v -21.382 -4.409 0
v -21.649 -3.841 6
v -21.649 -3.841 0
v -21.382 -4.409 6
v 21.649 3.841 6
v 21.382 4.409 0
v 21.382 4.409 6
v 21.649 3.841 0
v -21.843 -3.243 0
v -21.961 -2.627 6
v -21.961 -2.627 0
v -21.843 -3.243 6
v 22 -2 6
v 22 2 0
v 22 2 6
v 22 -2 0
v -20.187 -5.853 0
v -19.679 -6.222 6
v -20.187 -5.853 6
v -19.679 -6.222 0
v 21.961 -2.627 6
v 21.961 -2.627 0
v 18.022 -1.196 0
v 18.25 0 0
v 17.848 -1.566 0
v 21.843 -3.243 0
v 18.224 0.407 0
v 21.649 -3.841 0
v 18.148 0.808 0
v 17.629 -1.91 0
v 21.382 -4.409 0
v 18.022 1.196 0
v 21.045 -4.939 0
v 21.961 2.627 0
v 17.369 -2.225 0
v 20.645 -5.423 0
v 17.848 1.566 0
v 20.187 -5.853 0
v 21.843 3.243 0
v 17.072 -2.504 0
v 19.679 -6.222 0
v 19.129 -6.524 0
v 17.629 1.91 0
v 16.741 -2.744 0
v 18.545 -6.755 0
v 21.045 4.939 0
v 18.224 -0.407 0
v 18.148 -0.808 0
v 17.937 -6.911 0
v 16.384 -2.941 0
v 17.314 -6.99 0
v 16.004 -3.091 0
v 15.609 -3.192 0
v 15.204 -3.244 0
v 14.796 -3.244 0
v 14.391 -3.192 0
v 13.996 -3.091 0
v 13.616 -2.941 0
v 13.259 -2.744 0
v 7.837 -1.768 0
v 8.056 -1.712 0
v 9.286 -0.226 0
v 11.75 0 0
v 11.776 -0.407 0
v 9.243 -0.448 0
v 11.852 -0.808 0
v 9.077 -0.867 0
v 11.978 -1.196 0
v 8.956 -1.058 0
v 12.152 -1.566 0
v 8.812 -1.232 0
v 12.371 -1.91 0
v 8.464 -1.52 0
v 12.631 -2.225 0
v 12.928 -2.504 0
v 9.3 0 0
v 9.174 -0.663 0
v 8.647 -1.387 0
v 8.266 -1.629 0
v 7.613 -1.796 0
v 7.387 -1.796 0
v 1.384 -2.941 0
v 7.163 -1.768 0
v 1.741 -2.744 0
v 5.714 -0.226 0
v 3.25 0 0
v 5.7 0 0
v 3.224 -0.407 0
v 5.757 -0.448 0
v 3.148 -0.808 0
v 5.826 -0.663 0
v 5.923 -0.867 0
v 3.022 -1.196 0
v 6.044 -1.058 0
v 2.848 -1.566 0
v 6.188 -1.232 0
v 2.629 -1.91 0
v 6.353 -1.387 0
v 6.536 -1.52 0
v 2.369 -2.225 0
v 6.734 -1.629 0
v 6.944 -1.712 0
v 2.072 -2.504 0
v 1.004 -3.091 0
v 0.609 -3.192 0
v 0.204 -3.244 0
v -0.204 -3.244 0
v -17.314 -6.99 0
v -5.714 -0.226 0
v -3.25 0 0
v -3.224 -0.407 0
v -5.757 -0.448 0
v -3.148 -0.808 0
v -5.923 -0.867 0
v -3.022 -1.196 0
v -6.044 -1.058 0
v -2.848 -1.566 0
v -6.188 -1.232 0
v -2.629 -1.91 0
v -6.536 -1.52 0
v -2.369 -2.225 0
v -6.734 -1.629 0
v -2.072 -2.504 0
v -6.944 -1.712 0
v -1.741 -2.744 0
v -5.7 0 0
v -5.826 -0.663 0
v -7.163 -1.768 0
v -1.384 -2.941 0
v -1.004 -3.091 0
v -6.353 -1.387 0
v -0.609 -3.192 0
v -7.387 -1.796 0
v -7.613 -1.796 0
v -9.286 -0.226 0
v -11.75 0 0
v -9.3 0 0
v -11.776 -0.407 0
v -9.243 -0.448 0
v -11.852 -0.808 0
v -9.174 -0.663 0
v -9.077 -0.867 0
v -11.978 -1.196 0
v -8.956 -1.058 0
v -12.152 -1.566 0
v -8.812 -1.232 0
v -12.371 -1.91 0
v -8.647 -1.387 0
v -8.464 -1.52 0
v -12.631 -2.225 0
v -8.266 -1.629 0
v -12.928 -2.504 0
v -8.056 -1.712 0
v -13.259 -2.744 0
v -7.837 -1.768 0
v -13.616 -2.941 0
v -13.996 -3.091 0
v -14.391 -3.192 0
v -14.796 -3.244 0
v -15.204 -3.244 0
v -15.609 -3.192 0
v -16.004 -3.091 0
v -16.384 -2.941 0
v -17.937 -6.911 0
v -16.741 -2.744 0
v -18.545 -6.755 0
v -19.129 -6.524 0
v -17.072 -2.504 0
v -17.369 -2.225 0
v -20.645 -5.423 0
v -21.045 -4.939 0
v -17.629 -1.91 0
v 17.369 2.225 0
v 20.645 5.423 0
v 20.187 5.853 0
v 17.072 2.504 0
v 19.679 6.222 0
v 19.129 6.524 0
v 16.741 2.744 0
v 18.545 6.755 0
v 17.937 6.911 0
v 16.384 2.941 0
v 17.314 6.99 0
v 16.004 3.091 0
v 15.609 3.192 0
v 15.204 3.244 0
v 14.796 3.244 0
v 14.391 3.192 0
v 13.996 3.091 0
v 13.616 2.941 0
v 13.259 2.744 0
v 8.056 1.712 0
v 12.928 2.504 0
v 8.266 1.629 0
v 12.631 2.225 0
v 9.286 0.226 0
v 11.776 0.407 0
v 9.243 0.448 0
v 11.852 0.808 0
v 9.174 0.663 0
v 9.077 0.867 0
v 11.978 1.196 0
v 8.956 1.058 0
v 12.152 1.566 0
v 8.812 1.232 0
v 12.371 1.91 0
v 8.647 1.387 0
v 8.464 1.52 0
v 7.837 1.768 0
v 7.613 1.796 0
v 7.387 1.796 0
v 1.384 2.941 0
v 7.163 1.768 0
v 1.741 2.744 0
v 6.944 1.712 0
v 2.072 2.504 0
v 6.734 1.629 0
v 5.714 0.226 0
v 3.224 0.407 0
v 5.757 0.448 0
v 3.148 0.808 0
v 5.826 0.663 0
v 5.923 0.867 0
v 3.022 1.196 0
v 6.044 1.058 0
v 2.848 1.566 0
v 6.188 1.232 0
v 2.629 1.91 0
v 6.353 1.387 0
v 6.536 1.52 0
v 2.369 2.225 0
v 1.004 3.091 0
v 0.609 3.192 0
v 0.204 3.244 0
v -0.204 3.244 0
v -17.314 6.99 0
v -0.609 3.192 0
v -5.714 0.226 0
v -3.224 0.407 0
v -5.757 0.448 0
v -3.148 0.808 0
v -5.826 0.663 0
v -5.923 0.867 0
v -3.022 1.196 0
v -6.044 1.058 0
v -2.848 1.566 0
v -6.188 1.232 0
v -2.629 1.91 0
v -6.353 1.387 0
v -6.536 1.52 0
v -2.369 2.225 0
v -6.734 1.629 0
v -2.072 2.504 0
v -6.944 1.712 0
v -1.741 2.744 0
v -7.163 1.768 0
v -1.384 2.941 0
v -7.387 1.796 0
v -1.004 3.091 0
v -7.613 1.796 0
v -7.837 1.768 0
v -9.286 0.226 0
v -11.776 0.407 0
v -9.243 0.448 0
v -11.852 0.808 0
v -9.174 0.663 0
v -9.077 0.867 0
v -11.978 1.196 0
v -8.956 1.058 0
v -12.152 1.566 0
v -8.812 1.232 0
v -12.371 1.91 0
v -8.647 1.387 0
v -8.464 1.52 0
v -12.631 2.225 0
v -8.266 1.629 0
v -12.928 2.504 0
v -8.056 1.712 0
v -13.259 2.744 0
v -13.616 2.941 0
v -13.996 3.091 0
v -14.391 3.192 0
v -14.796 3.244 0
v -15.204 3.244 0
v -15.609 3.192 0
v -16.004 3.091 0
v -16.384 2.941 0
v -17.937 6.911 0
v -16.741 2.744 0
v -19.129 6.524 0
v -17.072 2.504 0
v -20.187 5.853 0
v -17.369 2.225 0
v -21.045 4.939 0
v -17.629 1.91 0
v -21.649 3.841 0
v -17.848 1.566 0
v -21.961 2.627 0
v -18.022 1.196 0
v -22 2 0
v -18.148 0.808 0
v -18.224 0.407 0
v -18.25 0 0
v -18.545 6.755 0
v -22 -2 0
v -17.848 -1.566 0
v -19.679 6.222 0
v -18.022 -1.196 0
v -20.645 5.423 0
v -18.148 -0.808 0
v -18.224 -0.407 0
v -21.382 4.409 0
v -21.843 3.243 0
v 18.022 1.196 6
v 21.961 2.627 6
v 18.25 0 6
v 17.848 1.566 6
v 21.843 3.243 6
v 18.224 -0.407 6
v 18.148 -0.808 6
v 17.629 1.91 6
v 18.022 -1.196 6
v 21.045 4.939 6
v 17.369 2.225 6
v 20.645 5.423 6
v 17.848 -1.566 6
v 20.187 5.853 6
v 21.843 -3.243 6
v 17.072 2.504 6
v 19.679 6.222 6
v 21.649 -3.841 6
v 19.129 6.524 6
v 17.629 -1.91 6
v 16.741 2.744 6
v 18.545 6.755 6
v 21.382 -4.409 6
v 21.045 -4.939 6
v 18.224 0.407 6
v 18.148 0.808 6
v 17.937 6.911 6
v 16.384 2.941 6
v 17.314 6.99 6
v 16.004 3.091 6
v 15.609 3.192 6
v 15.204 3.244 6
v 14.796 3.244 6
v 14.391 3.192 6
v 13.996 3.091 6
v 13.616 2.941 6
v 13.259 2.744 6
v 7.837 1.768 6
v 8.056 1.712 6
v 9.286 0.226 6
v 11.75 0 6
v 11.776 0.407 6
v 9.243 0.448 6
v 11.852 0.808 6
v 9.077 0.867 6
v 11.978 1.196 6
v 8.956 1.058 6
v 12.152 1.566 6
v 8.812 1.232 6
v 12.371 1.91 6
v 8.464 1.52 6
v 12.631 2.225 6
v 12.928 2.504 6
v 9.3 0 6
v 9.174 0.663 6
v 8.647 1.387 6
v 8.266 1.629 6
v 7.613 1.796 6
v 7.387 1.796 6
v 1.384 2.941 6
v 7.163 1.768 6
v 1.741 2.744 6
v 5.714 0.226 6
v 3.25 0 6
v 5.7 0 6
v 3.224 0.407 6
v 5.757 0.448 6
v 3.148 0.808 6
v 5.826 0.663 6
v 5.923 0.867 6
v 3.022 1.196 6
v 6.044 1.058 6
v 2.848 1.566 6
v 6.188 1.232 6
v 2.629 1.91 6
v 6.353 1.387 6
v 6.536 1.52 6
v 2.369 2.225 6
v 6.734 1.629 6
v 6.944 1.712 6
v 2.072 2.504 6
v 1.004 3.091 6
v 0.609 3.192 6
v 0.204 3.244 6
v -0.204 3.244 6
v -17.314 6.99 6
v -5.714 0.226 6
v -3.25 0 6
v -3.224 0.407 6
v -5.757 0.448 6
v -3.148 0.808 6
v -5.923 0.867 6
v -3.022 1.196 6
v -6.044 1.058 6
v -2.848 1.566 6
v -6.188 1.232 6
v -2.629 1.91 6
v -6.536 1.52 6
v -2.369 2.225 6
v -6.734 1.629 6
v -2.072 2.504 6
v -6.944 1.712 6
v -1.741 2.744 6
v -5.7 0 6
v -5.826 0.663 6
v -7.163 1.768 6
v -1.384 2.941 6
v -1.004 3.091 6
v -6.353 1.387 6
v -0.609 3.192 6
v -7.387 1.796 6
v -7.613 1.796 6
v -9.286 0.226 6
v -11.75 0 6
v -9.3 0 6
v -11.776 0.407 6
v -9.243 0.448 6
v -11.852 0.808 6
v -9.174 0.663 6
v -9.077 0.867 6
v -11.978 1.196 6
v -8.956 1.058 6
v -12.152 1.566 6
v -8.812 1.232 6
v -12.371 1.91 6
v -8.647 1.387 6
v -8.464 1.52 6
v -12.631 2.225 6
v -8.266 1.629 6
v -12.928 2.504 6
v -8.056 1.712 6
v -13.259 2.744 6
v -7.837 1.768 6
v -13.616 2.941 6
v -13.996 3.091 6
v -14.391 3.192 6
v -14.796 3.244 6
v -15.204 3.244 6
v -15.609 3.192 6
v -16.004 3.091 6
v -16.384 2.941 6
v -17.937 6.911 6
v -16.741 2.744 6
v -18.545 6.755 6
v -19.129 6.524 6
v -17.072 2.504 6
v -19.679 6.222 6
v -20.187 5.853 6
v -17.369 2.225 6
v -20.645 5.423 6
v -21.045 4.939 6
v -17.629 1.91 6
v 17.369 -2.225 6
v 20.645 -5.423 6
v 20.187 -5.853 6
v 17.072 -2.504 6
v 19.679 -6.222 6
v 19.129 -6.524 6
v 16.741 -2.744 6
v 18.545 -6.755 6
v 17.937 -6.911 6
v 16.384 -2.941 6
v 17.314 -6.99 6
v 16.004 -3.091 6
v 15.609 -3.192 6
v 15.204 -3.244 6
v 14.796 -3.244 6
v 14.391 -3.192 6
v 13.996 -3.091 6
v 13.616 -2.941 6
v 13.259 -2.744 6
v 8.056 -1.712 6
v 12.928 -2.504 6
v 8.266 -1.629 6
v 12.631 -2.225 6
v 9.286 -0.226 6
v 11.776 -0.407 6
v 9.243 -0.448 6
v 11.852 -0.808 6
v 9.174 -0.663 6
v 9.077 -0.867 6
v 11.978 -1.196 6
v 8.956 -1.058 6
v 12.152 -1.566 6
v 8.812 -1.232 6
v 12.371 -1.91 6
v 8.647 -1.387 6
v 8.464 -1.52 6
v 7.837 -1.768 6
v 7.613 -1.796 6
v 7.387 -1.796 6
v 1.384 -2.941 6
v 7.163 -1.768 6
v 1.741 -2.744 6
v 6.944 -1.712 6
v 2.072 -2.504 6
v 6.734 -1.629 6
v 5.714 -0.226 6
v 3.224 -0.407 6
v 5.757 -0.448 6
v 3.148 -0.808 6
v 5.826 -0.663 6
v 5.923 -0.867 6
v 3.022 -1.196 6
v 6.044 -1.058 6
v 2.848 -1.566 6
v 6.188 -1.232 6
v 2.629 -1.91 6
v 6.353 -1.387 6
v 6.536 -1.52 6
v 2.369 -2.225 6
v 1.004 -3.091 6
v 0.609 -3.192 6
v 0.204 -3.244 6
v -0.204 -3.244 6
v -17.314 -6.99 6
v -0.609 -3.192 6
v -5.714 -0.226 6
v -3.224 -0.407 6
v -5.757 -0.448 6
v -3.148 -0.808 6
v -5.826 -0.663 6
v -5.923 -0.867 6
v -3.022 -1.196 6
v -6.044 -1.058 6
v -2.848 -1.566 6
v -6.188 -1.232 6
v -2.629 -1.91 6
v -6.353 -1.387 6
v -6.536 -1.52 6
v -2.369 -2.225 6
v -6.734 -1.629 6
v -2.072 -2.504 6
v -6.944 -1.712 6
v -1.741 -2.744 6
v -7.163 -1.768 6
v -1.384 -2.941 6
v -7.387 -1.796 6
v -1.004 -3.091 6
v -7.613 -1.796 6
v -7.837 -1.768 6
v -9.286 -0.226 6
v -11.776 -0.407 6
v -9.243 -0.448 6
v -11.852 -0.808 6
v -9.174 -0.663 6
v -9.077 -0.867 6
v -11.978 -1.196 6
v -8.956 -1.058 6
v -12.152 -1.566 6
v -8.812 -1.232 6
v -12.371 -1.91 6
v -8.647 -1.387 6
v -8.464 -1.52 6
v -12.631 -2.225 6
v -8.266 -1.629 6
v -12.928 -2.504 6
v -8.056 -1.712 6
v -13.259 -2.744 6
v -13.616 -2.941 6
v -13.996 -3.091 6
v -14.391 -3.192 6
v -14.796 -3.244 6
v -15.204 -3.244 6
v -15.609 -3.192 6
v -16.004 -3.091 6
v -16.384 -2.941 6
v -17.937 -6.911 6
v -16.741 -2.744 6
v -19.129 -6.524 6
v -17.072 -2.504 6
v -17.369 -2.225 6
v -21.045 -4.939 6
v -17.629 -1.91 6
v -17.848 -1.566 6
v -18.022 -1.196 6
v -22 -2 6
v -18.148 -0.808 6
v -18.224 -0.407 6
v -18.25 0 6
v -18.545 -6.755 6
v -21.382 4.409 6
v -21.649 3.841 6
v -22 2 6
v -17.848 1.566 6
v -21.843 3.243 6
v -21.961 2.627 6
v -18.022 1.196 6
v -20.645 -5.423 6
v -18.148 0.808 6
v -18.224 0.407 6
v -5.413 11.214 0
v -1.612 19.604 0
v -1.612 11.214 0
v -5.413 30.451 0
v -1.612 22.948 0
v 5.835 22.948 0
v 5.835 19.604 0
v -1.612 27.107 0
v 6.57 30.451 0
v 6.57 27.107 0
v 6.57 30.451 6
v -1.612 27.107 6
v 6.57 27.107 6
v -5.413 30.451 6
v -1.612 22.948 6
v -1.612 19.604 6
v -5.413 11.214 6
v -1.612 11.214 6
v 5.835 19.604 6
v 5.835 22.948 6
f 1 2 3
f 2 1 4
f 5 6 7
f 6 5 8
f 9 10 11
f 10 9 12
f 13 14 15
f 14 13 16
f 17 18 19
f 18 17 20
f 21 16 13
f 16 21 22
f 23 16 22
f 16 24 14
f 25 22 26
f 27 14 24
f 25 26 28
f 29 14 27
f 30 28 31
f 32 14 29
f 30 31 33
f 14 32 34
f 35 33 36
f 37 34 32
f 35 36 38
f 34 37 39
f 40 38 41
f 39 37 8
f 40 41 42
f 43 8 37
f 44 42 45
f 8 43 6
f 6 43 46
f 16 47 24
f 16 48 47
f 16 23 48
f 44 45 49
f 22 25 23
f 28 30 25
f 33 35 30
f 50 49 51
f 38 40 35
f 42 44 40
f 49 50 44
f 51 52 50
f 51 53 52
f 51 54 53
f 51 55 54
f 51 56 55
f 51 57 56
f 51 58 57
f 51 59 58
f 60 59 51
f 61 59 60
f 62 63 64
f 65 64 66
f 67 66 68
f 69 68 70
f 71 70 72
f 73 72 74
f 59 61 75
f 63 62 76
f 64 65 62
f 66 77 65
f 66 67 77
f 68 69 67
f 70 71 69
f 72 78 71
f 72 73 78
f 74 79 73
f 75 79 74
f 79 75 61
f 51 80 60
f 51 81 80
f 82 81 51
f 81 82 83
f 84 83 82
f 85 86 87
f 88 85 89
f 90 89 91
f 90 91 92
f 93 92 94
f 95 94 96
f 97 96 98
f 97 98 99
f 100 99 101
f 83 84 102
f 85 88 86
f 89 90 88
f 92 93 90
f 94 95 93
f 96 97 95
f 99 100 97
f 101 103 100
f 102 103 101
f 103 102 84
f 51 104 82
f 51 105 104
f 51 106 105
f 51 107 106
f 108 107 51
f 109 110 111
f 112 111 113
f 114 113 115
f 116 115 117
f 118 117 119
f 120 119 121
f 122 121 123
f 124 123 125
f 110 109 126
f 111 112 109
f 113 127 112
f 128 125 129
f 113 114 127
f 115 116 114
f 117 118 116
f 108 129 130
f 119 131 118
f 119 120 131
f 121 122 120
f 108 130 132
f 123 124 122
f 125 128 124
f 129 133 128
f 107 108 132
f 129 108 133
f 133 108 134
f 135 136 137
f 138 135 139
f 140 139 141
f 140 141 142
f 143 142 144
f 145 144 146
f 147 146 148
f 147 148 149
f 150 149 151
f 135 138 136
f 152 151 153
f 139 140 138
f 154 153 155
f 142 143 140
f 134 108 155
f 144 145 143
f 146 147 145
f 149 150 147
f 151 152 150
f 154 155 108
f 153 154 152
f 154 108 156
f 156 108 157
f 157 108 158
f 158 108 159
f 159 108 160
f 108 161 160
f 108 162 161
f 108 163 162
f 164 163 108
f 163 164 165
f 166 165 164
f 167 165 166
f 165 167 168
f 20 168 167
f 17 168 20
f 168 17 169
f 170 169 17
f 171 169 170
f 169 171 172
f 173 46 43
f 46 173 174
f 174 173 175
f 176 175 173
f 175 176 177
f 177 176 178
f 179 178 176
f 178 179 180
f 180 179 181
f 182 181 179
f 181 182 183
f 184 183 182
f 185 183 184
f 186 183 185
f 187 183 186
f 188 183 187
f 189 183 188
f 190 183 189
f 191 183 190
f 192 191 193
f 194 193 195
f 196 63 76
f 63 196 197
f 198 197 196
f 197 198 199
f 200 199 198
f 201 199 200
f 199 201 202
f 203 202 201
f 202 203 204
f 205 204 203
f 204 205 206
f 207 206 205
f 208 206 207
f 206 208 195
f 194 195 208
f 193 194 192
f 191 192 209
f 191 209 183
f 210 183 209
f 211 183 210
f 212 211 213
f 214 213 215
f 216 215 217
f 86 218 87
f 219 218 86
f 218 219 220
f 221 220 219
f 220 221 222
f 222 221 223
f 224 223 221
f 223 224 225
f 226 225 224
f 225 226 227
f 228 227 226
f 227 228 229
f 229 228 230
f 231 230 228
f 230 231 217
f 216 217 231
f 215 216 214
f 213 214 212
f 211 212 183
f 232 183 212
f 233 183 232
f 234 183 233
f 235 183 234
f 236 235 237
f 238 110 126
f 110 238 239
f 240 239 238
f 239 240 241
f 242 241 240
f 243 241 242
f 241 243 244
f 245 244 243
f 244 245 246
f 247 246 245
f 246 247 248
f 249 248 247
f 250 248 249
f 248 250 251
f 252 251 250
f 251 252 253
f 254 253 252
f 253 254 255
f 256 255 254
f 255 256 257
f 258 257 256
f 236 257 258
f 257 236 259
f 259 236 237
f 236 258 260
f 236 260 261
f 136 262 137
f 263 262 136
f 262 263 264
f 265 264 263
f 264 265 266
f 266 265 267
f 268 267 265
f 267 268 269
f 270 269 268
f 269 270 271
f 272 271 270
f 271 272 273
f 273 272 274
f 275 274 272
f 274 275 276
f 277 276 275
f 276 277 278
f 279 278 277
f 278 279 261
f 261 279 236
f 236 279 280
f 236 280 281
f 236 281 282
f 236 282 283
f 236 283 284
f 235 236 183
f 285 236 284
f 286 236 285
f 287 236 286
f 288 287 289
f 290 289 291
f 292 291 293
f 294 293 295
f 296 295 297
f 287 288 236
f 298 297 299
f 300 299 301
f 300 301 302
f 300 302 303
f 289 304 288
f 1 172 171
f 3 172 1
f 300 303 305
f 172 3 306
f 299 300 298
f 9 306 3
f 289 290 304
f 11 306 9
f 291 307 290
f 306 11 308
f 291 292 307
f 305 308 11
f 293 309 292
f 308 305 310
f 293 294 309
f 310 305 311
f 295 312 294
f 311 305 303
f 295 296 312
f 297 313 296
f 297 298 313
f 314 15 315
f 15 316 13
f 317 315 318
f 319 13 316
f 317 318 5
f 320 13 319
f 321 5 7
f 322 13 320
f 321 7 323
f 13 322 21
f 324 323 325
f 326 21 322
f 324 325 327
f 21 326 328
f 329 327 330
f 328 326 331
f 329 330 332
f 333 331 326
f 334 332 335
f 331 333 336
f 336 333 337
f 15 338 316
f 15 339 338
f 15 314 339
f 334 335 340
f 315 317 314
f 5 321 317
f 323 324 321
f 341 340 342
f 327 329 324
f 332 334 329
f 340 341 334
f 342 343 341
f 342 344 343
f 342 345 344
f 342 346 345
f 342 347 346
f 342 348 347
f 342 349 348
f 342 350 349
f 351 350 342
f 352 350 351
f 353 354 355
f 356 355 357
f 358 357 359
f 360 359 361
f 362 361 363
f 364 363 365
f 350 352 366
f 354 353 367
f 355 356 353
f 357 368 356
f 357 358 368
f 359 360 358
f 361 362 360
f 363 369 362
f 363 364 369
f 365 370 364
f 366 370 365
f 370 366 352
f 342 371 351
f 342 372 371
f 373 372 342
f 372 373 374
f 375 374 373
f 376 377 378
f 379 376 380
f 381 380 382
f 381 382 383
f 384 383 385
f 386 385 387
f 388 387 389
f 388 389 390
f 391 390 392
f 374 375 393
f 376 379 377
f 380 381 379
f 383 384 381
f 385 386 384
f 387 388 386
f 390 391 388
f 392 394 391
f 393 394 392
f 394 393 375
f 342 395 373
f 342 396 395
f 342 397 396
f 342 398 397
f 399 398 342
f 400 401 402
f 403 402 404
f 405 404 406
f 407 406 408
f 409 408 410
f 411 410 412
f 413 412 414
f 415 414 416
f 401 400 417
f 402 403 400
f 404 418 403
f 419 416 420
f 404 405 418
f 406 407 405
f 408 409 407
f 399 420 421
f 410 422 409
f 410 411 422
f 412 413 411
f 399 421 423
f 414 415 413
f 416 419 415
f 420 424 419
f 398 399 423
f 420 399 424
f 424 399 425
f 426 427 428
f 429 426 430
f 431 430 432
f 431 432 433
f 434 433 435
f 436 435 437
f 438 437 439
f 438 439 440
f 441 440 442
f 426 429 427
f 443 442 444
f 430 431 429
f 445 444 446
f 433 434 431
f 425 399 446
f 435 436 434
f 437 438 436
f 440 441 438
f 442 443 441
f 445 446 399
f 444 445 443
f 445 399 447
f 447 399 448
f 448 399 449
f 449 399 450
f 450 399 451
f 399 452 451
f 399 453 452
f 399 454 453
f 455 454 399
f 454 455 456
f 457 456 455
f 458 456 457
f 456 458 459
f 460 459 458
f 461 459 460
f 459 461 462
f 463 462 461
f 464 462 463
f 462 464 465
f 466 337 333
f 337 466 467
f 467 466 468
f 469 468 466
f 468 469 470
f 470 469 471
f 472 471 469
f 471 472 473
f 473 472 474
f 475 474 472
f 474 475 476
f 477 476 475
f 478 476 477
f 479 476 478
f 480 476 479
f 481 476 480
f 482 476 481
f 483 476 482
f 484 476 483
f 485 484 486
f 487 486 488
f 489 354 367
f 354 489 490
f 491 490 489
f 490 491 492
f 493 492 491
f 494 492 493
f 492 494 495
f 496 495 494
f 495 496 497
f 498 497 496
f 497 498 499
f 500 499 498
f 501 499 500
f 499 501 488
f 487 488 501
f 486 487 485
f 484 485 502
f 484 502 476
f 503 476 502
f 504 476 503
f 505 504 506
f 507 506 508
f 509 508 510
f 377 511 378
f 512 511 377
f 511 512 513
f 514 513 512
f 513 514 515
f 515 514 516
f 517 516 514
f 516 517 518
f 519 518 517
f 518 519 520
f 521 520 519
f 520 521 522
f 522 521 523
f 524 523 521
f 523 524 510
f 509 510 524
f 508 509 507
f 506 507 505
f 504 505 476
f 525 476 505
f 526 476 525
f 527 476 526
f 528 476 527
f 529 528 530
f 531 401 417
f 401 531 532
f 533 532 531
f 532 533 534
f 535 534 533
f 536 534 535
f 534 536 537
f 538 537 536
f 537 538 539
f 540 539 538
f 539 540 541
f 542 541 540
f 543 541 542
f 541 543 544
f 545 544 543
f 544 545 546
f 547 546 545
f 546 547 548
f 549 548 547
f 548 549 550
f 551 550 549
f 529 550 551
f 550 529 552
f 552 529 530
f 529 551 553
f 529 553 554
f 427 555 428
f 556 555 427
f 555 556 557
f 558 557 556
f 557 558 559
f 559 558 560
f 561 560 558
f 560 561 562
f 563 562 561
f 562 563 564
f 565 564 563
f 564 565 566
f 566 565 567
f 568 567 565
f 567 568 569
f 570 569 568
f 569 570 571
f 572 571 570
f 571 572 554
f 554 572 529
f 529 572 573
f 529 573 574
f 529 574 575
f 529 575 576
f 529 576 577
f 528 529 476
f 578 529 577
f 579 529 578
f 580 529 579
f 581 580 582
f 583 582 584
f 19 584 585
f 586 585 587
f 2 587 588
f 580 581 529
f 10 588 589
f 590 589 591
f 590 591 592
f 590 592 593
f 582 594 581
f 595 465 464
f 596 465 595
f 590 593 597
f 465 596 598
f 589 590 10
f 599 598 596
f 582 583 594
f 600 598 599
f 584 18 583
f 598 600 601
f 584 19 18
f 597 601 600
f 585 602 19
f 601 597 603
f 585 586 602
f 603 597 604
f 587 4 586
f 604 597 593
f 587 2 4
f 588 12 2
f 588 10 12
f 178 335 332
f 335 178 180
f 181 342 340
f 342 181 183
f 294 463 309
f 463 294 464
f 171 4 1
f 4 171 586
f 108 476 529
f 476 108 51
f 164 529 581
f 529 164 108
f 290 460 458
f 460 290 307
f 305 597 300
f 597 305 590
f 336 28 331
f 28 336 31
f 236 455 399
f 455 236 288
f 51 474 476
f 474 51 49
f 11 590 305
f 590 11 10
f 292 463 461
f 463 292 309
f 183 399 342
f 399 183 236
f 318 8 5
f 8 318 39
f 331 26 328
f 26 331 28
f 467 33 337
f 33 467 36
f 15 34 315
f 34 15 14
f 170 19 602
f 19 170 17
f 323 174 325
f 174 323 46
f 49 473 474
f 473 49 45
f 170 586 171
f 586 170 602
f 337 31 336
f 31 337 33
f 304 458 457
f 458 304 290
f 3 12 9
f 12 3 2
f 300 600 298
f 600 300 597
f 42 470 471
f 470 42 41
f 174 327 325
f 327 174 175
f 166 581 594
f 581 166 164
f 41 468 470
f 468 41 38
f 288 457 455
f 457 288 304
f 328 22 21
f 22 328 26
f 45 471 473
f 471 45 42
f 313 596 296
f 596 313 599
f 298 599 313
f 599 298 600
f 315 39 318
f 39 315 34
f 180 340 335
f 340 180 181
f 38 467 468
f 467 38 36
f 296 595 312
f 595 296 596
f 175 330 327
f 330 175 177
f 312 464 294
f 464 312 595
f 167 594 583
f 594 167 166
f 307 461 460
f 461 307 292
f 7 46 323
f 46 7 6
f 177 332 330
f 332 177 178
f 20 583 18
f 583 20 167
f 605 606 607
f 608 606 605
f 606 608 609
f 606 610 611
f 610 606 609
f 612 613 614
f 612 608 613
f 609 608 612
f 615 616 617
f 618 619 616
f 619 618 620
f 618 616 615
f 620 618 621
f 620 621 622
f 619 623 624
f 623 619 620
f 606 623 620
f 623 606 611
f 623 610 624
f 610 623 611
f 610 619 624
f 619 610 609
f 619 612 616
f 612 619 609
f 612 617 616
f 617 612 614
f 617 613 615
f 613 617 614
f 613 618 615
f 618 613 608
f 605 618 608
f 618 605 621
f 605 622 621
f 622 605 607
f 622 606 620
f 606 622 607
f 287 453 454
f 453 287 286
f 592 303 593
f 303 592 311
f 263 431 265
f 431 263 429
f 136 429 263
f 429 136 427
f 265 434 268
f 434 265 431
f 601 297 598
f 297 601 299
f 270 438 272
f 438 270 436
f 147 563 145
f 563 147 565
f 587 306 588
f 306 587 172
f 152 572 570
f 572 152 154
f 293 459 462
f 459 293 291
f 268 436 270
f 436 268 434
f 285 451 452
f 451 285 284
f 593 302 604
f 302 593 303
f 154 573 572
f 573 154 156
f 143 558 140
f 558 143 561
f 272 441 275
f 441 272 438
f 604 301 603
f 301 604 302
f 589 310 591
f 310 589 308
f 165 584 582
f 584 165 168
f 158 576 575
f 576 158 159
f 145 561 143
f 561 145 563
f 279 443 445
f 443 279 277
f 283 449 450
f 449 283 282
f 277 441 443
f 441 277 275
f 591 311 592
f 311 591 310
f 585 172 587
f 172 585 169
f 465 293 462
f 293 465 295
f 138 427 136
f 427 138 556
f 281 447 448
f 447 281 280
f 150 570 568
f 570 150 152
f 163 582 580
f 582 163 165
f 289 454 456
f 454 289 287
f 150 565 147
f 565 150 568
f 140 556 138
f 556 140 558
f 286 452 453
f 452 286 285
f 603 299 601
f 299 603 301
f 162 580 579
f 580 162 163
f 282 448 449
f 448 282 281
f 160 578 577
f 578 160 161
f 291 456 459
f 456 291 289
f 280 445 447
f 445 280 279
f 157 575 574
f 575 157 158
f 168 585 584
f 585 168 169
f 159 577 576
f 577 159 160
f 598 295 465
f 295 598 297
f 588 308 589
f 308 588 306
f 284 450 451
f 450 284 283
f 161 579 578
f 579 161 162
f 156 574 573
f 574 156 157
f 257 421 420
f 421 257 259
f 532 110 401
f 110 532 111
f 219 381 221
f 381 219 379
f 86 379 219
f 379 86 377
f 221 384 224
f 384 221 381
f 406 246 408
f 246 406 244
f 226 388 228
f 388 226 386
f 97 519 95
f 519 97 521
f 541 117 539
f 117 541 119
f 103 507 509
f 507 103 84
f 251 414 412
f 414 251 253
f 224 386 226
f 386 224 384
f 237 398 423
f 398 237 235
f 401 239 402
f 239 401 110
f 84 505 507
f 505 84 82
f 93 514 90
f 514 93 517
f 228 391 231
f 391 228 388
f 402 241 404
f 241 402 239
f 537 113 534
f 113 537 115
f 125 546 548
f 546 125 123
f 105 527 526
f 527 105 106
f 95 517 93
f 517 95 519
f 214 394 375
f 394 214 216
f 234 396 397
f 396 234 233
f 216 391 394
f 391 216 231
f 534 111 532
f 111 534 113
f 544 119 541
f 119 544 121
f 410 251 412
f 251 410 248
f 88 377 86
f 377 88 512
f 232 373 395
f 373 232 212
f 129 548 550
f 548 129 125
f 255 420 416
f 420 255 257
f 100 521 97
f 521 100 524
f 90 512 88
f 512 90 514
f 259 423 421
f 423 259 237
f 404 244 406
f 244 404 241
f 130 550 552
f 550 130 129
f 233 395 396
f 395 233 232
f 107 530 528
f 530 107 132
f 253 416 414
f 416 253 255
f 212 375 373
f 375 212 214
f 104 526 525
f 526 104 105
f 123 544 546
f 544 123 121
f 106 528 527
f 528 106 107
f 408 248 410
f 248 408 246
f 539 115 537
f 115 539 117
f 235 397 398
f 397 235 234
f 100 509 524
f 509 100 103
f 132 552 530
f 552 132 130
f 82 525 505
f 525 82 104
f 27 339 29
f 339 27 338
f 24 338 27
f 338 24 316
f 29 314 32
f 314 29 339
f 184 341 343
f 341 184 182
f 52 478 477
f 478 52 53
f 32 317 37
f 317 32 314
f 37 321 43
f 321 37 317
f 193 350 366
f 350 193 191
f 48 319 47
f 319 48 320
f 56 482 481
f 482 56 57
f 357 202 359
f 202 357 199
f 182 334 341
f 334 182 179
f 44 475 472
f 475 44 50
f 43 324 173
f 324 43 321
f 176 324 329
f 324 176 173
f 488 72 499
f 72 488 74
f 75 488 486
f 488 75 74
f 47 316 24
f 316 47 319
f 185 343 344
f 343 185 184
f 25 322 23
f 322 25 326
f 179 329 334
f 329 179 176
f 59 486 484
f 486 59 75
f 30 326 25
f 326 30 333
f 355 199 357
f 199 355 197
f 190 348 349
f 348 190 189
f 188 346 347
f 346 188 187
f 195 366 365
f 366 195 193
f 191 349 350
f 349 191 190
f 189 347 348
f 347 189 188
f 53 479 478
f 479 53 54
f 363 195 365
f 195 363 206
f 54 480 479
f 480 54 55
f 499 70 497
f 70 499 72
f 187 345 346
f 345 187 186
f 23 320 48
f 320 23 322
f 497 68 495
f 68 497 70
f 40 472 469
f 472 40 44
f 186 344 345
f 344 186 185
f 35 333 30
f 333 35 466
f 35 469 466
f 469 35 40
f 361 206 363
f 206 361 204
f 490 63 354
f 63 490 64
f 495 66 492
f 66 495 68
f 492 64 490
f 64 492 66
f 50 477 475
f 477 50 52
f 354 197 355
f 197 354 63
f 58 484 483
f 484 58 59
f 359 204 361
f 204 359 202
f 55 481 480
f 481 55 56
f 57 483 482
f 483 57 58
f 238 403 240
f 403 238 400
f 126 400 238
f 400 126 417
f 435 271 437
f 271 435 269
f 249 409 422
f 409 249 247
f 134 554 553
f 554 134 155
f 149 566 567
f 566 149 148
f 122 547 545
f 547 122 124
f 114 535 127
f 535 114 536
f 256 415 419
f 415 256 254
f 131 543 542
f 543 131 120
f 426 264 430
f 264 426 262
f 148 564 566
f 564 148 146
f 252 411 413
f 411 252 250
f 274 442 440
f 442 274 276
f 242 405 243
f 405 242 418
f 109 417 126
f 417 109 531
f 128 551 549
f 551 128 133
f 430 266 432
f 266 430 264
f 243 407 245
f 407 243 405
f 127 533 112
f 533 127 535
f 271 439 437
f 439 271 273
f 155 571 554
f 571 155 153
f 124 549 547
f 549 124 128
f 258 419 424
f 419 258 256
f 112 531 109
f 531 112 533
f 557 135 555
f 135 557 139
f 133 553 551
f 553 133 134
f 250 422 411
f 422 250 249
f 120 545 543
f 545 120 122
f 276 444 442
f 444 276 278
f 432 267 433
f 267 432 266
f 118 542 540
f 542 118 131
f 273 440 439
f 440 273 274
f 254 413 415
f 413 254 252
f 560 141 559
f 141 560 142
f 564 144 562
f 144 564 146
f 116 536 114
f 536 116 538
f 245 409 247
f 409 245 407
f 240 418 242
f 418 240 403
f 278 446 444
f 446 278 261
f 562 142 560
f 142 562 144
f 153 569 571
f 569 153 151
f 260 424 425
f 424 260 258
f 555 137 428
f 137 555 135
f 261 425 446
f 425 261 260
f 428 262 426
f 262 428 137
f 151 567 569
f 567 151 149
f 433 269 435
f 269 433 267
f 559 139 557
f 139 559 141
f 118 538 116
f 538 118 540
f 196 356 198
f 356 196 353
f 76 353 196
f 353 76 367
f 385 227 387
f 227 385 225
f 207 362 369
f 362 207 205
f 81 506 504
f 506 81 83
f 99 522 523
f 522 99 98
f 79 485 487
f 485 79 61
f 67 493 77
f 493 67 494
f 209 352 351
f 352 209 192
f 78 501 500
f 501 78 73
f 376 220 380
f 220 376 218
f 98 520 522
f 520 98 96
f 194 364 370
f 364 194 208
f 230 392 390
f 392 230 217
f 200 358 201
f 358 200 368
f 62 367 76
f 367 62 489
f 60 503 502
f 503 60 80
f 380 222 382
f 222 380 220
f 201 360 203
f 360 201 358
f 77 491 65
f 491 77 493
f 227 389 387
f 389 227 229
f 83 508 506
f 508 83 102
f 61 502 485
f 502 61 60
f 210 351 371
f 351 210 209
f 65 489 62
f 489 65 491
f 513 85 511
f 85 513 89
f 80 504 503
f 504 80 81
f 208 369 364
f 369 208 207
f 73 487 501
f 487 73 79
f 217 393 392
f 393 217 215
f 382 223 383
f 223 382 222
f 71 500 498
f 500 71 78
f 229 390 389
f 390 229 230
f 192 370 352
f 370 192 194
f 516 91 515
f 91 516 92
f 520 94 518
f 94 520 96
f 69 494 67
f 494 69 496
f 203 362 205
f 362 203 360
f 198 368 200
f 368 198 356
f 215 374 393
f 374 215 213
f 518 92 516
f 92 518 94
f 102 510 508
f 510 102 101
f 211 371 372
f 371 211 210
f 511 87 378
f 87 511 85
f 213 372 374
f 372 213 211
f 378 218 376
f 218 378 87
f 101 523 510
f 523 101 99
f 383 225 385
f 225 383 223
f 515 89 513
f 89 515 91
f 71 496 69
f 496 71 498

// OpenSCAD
$fn = 50;


difference() {
	union() {
		hull() {
			translate(v = [-17.0000000000, 2.0000000000, 0]) {
				cylinder(h = 6, r = 5);
			}
			translate(v = [17.0000000000, 2.0000000000, 0]) {
				cylinder(h = 6, r = 5);
			}
			translate(v = [-17.0000000000, -2.0000000000, 0]) {
				cylinder(h = 6, r = 5);
			}
			translate(v = [17.0000000000, -2.0000000000, 0]) {
				cylinder(h = 6, r = 5);
			}
		}
		translate(v = [0, 30.0000000000, 0]) {
			linear_extrude(height = 6) {
				text(font = "DejaVu Sans Mono:style=Bold", halign = "center", size = 19.0000000000, text = "F", valign = "top");
			}
		}
	}
	union() {
		translate(v = [-15.0000000000, 0.0000000000, 0]) {
			translate(v = [0, 0, -100]) {
				cylinder(h = 200, r = 3.2500000000);
			}
		}
		translate(v = [0, 0, -100]) {
			cylinder(h = 200, r = 3.2500000000);
		}
		translate(v = [15.0000000000, 0.0000000000, 0]) {
			translate(v = [0, 0, -100]) {
				cylinder(h = 200, r = 3.2500000000);
			}
		}
		translate(v = [-15.0000000000, 0.0000000000, 0]) {
			translate(v = [0, 0, -100]) {
				cylinder(h = 200, r = 1.8000000000);
			}
		}
		translate(v = [-7.5000000000, 0.0000000000, 0]) {
			translate(v = [0, 0, -100]) {
				cylinder(h = 200, r = 1.8000000000);
			}
		}
		translate(v = [0, 0, -100]) {
			cylinder(h = 200, r = 1.8000000000);
		}
		translate(v = [7.5000000000, 0.0000000000, 0]) {
			translate(v = [0, 0, -100]) {
				cylinder(h = 200, r = 1.8000000000);
			}
		}
		translate(v = [15.0000000000, 0.0000000000, 0]) {
			translate(v = [0, 0, -100]) {
				cylinder(h = 200, r = 1.8000000000);
			}
		}
	}
}
